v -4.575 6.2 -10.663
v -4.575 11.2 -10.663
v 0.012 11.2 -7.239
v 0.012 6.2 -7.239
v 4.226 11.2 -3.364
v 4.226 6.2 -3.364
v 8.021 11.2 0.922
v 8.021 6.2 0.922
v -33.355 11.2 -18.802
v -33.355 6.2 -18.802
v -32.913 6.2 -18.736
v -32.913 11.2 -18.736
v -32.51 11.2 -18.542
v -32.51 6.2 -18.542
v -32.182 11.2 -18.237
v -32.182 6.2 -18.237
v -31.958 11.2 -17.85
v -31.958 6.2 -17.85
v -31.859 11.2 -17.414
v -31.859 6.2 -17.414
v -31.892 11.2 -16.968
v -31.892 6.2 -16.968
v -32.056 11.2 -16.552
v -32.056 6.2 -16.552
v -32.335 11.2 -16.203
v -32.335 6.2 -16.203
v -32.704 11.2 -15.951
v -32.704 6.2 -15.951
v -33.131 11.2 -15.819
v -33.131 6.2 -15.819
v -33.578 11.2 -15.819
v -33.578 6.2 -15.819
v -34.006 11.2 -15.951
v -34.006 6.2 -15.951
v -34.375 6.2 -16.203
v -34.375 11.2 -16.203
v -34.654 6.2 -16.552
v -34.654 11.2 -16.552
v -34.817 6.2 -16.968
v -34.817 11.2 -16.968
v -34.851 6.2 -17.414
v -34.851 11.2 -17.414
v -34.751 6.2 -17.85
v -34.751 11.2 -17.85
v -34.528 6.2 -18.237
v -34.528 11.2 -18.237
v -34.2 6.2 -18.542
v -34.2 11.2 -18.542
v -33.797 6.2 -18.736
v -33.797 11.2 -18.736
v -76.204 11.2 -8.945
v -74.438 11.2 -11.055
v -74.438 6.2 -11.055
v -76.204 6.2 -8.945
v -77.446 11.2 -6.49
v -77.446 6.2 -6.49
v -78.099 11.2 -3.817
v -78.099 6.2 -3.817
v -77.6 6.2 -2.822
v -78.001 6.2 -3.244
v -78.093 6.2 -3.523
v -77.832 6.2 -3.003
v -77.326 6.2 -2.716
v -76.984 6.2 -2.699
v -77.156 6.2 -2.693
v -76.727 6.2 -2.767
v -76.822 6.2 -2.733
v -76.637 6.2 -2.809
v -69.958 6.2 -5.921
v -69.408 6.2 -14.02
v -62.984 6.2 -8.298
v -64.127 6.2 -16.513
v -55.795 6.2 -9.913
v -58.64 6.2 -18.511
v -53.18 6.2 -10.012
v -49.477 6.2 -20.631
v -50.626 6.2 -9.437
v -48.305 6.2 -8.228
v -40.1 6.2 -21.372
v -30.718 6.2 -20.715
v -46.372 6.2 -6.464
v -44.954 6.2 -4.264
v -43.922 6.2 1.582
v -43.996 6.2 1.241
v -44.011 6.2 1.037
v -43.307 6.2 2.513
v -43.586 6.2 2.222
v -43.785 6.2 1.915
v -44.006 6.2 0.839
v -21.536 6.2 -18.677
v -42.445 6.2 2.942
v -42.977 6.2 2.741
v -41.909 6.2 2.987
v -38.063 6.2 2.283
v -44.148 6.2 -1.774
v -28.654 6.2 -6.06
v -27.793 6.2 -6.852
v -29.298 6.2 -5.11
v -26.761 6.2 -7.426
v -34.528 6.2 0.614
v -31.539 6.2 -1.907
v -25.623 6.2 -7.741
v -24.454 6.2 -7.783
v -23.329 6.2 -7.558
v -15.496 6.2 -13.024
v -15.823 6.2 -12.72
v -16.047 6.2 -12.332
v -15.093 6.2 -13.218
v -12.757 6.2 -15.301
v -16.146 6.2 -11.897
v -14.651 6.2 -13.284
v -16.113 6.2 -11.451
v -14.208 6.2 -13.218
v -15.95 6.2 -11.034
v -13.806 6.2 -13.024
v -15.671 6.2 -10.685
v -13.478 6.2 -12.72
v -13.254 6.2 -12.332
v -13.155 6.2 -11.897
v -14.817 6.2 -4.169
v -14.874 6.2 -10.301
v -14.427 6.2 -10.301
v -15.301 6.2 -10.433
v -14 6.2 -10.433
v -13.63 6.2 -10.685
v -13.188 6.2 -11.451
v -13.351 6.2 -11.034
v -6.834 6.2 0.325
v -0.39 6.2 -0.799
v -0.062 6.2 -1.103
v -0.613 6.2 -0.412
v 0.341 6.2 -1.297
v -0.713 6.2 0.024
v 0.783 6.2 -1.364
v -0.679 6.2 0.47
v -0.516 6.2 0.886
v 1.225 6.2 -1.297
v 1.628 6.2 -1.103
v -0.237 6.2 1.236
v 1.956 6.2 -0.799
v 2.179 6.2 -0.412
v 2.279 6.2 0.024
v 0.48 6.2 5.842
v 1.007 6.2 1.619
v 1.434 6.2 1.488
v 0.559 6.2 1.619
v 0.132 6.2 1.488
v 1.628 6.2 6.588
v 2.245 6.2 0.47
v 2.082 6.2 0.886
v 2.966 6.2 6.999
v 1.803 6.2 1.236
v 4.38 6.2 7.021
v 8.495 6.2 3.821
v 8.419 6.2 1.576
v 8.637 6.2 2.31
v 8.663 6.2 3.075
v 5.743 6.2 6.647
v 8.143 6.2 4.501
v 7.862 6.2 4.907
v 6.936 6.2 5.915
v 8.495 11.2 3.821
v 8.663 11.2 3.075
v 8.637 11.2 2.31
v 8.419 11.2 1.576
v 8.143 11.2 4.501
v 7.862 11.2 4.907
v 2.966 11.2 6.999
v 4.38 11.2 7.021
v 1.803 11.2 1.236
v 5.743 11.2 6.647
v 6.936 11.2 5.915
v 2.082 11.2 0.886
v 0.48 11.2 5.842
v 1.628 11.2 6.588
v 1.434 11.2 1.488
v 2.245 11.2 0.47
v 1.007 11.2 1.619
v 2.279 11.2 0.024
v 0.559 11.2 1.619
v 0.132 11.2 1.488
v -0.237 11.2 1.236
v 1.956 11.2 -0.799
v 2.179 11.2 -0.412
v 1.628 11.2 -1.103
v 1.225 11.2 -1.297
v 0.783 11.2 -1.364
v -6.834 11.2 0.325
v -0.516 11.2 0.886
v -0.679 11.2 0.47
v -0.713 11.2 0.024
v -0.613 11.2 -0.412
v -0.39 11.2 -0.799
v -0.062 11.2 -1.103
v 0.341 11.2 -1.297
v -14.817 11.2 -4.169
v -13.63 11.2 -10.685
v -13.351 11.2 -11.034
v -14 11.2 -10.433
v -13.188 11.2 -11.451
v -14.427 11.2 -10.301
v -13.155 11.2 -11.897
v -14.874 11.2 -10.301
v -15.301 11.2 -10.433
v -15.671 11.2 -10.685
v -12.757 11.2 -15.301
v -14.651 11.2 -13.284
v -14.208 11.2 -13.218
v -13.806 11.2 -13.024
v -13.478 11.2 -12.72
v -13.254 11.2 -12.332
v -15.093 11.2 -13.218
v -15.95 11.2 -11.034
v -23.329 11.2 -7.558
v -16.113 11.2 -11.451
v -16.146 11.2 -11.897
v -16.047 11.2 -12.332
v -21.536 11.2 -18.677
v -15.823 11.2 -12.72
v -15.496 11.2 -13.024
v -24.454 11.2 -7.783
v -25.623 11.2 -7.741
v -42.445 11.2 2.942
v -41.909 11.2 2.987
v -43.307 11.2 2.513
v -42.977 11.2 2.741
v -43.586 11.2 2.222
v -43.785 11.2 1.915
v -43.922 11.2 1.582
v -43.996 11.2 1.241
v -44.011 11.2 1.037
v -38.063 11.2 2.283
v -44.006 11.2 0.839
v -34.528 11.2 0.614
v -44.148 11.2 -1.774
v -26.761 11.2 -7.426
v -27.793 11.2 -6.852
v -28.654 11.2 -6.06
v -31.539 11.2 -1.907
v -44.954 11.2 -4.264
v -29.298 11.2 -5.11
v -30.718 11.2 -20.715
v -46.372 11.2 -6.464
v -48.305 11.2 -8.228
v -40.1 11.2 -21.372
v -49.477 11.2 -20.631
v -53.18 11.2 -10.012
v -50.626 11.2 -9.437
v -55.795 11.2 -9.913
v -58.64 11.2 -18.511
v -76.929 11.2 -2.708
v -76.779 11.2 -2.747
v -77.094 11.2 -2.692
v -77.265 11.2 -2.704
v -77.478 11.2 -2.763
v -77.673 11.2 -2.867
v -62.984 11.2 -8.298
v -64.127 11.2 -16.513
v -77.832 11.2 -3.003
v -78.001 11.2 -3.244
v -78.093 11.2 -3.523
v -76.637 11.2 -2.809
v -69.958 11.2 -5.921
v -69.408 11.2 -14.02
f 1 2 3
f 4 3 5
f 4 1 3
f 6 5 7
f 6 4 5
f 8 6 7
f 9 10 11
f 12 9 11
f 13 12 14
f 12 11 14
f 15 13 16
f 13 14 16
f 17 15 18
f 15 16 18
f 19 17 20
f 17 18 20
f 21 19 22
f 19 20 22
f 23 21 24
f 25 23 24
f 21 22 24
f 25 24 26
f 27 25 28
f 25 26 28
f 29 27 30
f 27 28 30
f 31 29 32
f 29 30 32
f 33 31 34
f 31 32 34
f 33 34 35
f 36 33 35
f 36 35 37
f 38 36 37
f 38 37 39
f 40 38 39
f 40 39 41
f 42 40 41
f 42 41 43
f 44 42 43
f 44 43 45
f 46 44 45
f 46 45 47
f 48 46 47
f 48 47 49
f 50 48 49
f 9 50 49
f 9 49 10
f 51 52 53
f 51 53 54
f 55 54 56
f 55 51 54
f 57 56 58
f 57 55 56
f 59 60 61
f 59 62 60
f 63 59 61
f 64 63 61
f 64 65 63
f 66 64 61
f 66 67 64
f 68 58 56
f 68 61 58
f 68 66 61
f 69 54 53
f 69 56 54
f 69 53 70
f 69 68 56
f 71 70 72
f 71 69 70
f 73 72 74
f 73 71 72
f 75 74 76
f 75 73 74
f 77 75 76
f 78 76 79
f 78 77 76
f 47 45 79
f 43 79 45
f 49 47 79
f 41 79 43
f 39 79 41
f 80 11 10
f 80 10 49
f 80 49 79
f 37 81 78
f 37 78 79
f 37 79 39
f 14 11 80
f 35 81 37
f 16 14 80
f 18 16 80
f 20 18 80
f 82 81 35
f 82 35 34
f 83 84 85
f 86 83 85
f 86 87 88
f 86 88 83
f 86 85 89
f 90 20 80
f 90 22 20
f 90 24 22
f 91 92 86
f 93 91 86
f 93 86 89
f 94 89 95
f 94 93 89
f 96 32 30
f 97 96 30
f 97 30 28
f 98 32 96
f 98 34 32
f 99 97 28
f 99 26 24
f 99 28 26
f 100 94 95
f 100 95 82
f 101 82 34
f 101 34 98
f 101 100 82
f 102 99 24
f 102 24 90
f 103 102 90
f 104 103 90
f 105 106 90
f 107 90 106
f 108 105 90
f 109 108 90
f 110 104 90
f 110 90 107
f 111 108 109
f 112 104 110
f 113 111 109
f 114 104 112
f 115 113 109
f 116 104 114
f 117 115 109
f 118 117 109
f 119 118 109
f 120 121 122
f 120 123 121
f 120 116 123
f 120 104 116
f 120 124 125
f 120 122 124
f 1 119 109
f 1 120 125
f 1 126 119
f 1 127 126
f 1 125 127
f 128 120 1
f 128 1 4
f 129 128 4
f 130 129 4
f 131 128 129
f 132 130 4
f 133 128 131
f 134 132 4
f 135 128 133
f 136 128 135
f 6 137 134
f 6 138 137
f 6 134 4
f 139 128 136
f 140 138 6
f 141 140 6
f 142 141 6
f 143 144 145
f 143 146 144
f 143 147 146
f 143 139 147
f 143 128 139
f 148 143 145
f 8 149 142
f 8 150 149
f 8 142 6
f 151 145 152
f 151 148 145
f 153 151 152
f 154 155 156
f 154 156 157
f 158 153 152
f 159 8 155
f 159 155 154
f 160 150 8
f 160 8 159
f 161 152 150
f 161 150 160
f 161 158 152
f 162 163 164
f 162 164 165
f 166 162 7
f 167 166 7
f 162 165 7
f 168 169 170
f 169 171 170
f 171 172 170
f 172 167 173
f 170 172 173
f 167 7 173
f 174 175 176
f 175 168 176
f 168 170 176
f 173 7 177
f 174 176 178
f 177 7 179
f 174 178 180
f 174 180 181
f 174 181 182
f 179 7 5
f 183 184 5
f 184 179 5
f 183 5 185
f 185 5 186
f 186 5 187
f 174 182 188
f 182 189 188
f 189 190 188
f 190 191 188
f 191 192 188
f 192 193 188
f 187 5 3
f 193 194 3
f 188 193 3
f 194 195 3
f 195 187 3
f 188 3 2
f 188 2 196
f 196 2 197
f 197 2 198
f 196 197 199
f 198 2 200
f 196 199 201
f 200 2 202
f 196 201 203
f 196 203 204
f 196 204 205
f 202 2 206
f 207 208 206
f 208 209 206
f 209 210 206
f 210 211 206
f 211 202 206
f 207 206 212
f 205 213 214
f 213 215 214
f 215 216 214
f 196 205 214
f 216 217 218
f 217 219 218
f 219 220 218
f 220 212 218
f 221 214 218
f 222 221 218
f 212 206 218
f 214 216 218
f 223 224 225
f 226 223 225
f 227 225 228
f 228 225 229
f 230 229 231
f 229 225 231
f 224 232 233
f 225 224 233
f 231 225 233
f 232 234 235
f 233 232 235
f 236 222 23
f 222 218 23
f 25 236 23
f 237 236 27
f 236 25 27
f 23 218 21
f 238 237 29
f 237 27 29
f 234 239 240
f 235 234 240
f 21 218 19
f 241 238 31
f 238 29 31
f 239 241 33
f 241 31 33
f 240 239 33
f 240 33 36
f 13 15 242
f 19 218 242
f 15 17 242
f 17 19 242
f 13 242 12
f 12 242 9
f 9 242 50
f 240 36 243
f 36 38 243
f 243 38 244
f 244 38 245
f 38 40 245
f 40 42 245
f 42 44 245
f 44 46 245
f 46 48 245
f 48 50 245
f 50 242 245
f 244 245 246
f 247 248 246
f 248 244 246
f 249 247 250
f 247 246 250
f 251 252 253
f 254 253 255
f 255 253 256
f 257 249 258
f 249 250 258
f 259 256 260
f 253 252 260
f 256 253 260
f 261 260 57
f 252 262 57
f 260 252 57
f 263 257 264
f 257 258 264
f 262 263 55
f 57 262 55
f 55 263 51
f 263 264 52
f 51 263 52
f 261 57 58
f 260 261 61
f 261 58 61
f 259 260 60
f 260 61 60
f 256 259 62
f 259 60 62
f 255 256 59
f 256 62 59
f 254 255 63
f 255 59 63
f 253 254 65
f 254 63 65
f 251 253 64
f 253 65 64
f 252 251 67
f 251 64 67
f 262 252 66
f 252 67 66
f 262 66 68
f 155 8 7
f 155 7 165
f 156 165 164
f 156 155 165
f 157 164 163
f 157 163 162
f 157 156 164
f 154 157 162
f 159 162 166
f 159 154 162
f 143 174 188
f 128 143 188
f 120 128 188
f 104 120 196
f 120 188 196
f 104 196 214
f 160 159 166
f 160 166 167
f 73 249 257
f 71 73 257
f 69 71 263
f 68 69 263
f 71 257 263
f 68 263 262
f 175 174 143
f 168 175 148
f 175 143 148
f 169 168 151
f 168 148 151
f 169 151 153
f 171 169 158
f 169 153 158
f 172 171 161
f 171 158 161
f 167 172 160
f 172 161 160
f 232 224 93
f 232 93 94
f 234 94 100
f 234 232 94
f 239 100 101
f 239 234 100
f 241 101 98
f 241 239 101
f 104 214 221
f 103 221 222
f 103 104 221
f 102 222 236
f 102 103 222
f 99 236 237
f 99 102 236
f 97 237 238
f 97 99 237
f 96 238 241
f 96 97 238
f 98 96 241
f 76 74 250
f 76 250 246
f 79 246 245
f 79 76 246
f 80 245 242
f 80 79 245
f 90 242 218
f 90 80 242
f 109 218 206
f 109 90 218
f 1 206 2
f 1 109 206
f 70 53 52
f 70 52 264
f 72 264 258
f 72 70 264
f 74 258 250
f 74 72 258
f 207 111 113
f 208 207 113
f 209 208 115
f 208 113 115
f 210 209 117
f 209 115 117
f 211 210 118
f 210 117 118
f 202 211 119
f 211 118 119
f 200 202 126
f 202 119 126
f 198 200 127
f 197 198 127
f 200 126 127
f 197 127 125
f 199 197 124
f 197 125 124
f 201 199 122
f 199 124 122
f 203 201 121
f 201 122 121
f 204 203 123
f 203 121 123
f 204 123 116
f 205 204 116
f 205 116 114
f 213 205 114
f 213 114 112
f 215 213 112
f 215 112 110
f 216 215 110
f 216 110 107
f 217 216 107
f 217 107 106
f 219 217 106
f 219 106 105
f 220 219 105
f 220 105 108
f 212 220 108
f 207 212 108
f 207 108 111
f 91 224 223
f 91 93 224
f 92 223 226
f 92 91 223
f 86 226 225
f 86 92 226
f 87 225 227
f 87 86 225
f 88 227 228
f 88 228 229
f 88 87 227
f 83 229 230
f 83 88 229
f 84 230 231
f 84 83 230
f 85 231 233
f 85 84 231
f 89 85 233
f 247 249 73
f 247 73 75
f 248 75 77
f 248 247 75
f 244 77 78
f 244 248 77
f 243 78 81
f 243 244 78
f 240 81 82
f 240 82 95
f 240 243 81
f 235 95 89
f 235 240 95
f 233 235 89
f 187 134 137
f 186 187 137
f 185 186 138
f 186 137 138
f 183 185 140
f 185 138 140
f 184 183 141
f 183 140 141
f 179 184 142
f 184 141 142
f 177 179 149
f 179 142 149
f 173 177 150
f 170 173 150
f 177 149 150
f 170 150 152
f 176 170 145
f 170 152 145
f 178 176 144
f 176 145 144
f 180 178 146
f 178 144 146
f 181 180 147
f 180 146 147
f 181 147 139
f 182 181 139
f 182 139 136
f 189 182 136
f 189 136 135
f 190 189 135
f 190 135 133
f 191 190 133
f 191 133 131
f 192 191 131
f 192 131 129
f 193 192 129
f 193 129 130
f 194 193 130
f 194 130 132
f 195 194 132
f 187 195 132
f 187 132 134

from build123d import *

# Parameters (mm, degrees)
SKETCH_1_R               = 1.5
EXTRUDE_1_DEPTH          = 1.2
EXTRUDE_2_DEPTH          = 10
CUT_EXTRUDE_1_DEPTH      = 93.096371411
CUT_EXTRUDE_1_DEPTH_BACK = 93.096371411
SKETCH_4_R               = 1.5
CUT_EXTRUDE_2_DEPTH      = 5000
SKETCH_5_R               = 1.5
CUT_EXTRUDE_3_DEPTH      = 500
SKETCH_9_R               = 1.5
CUT_EXTRUDE_6_DEPTH      = 500
SKETCH_6_W               = 134.066841626
SKETCH_6_H               = 48.328770964
CUT_EXTRUDE_4_DEPTH      = 1.2
SKETCH_7_W               = 136.291178365
SKETCH_7_H               = 54.597356319
CUT_EXTRUDE_5_DEPTH      = 5
SKETCH_8_R               = 2.504998637
EXTRUDE_3_DEPTH          = 5
CUT_EXTRUDE_START        = -500
CUT_EXTRUDE_7_DEPTH      = 500
CUT_EXTRUDE_8_DEPTH      = 500
CUT_EXTRUDE_9_DEPTH      = 500
FILLET_2_R               = 5
EXTRUDE_4_DEPTH          = 5
FILLET_3_R               = 5
FILLET_4_R               = 2
CUT_EXTRUDE_10_DEPTH     = 50
FILLET_5_R               = 1


with BuildPart() as part:
    # 草图1 → 凸台-拉伸1 (new body)
    with BuildSketch(Plane(origin=(0, 0, 0), x_dir=(1, 0, 0), z_dir=(0, 1, 0))):
        with BuildLine():
            Line((1.554842025, -8.337470752), (-0.430182488, -6.721253648))
            add(Edge.make_bspline(
                [(-12.167013089, 2.582495486), (-11.447119164, 1.921340953), (-10.022984841, 2.808187734), (-8.976354657, 1.809108801), (-8.213499094, 1.403974471), (-8.200391236, 0.349911537), (-8.042555918, -0.493978579), (-7.818959944, -1.429413296), (-6.816890722, -1.753533483), (-5.863601288, -1.34252738), (-4.741281829, -1.710962858), (-4.08275959, -2.621388779), (-3.79245167, -3.751248723), (-3.91045161, -4.869308905), (-3.232112336, -5.62677615), (-2.206661316, -6.030432082), (-1.046114317, -6.062557348), (-0.554897819, -6.564537203), (-0.430182488, -6.721253648)],
                knots=[0, 0, 0, 0, 0.036097754, 0.047992692, 0.058181774, 0.069734768, 0.087708592, 0.096698401, 0.107023851, 0.126400839, 0.138602891, 0.153227265, 0.171393147, 0.187122158, 0.197485969, 0.211171774, 0.233173167, 0.241577569, 0.241577569, 0.241577569, 0.241577569], degree=3))
            add(Edge.make_bspline(
                [(-23.910622578, 9.605703978), (-23.558251314, 9.383041776), (-22.85001025, 7.300114936), (-21.469099437, 8.026620732), (-20.587576459, 8.115237732), (-19.709548371, 8.393102022), (-18.887373608, 8.016971733), (-18.216370279, 7.270572104), (-17.540916668, 6.495384207), (-16.917331111, 5.169819241), (-15.366310155, 5.588705202), (-13.906745135, 5.747852304), (-12.700950999, 4.350101993), (-12.869807319, 3.109436312), (-12.167013089, 2.582495486)],
                knots=[0, 0, 0, 0, 0.161236225, 0.212348344, 0.265446348, 0.336192936, 0.378687986, 0.430636784, 0.526782428, 0.58317029, 0.682556587, 0.781270878, 0.853713789, 1, 1, 1, 1], degree=3))
            add(Edge.make_bspline(
                [(-47.71500508, 10.605110168), (-47.069012481, 9.900665068), (-45.139196949, 9.95795741), (-43.921975491, 11.586374146), (-42.400721003, 11.771016568), (-41.337482007, 11.307681084), (-40.40808197, 10.571392493), (-39.243263098, 10.605948191), (-38.4214004, 11.389817674), (-37.304125392, 11.739033216), (-35.960015429, 12.177678326), (-35.169730239, 11.095889884), (-34.309116257, 10.597574945), (-33.230198284, 10.326758803), (-32.483614479, 11.172498611), (-31.555931442, 11.556931314), (-30.496219104, 11.833170836), (-29.544579211, 11.011421042), (-28.764862011, 9.931048883), (-27.275040054, 9.791587696), (-25.67786866, 9.995507673), (-24.429632089, 10.493743868), (-23.910622578, 9.605703978)],
                knots=[0, 0, 0, 0, 0.101433113, 0.182304189, 0.213922123, 0.268056796, 0.309965909, 0.34593792, 0.389140378, 0.432998877, 0.482664358, 0.529097115, 0.56671955, 0.598853252, 0.644172777, 0.680167064, 0.715860802, 0.759457234, 0.81099574, 0.863337515, 0.916048189, 1, 1, 1, 1], degree=3))
            add(Edge.make_bspline(
                [(-81.542178077, -6.351268144), (-81.044844843, -4.213625321), (-76.423345521, -7.044199198), (-77.193888837, -1.434611804), (-74.499558051, -1.007137962), (-72.119579546, -0.982023336), (-72.013913214, 2.531930358), (-69.193446107, 2.27076818), (-66.979018583, 2.576834428), (-66.793337265, 4.561491582), (-65.228171966, 5.86647802), (-63.704347585, 5.431207109), (-62.480661462, 5.233397848), (-61.483715157, 6.199125284), (-61.300552849, 7.503159562), (-59.783145719, 8.397586745), (-58.519758063, 7.703062295), (-57.095970203, 7.658840879), (-55.836025853, 8.294649296), (-55.32460036, 9.901269354), (-53.585326171, 9.702085323), (-52.400209447, 9.422945796), (-50.584393612, 8.813116301), (-50.168047343, 11.113872633), (-48.335164825, 11.166138113), (-47.71500508, 10.605110168)],
                knots=[0, 0, 0, 0, 0.100331873, 0.186040252, 0.234954161, 0.270300487, 0.337741822, 0.40191981, 0.438279808, 0.476829941, 0.523229195, 0.559516768, 0.58417291, 0.604077361, 0.648703103, 0.670042471, 0.715950186, 0.738312734, 0.768610762, 0.808997733, 0.834826144, 0.87587524, 0.906400305, 0.9417144, 1, 1, 1, 1], degree=3))
            add(Edge.make_bspline(
                [(-4.574887638, 10.66290641), (-7.047776333, 12.318799851), (-11.472376922, 14.618164059), (-18.644622628, 18.44627649), (-25.552826118, 20.285346034), (-32.311147255, 21.765124491), (-38.45622276, 22.334485332), (-46.036730806, 22.337974028), (-53.580560852, 21.321427277), (-60.391912278, 19.259553222), (-67.916492846, 16.400566872), (-77.044091587, 11.490220125), (-84.229889169, 5.096115142), (-88.471829307, 0.104808879), (-88.546333927, -3.099341055), (-86.895953255, -6.534699066), (-83.496346554, -7.409474397), (-81.542178077, -6.351268144)],
                knots=[0.083499365, 0.083499365, 0.083499365, 0.083499365, 0.162308773, 0.214040795, 0.297345888, 0.349154488, 0.396314503, 0.459530434, 0.548645129, 0.595484357, 0.646703325, 0.76081959, 0.864658636, 0.902713076, 0.926128156, 0.944546812, 1, 1, 1, 1], degree=3))
            ThreePointArc((-4.574887638, 10.66290641), (2.168791448, 5.355026647), (8.021297782, -0.921832822))
            ThreePointArc((8.021297782, -0.921832822), (8.67491192, -2.691224286), (8.143227785, -4.500994872))
            Line((8.143227785, -4.500994872), (5.915584874, -7.718701298))
            ThreePointArc((5.915584874, -7.718701298), (3.870472767, -8.981318439), (1.554842025, -8.337470752))
        make_face()
        with Locations(Location((-81.41369729, 0.541251493, 0), (0, 0, 270))):
            Circle(SKETCH_1_R, mode=Mode.SUBTRACT)
        with Locations(Location((0.783039877, -0.136157483, 0), (0, 0, 270))):
            Circle(SKETCH_1_R, mode=Mode.SUBTRACT)
        with Locations(Location((-33.354785226, 17.302208681, 0), (0, 0, 270))):
            Circle(SKETCH_1_R, mode=Mode.SUBTRACT)
    extrude(amount=EXTRUDE_1_DEPTH)

    # 草图2 → 凸台-拉伸2 (add)
    with BuildSketch(Plane(origin=(0, 1.2, 0), x_dir=(1, 0, 0), z_dir=(0, 1, 0))):
        with BuildLine():
            Line((8.143227785, -4.500994872), (5.915584874, -7.718701298))
            ThreePointArc((5.915584874, -7.718701298), (3.870472767, -8.981318439), (1.554842025, -8.337470752))
            ThreePointArc((1.554842025, -8.337470752), (-39.653813959, 6.874149931), (-81.542178077, -6.351268144))
            ThreePointArc((-81.542178077, -6.351268144), (-86.809846383, -6.371610018), (-88.423257633, -1.357066439))
            ThreePointArc((-88.423257633, -1.357066439), (-48.803984412, 20.731416825), (-4.574887638, 10.66290641))
            ThreePointArc((-4.574887638, 10.66290641), (2.168791448, 5.355026647), (8.021297782, -0.921832822))
            ThreePointArc((8.021297782, -0.921832822), (8.67491192, -2.691224286), (8.143227785, -4.500994872))
        make_face()
    extrude(amount=EXTRUDE_2_DEPTH)

    # 草图3 → 切除-拉伸1 (cut, two sides: drawn at the far end of the back side and taken through both)
    with BuildSketch(Plane(origin=(0, 11.2, 0), x_dir=(1, 0, 0), z_dir=(0, 1, 0)).offset(-CUT_EXTRUDE_1_DEPTH_BACK)):
        with BuildLine():
            Line((-87.507027042, -5.743661214), (-106.141269059, 14.985848881))
            Line((-106.141269059, 14.985848881), (-8.241902353, 31.206831816))
            Line((-8.241902353, 31.206831816), (8.962170457, 13.429289912))
            Line((8.962170457, 13.429289912), (8.021297782, -0.921832822))
            ThreePointArc((8.021297782, -0.921832822), (5.215580669, 2.32898401), (2.168791448, 5.355026647))
            ThreePointArc((2.168791448, 5.355026647), (-1.101119594, 8.138467032), (-4.574887638, 10.66290641))
            ThreePointArc((-4.574887638, 10.66290641), (-48.803984412, 20.731416825), (-88.423257633, -1.357066439))
            ThreePointArc((-88.423257633, -1.357066439), (-88.556022202, -3.673781246), (-87.507027042, -5.743661214))
        make_face()
        with BuildLine():
            Line((1.554842025, -8.337470752), (-81.542178077, -6.351268144))
            ThreePointArc((-81.542178077, -6.351268144), (-39.653813959, 6.874149931), (1.554842025, -8.337470752))
        make_face()
    extrude(amount=CUT_EXTRUDE_1_DEPTH + CUT_EXTRUDE_1_DEPTH_BACK, mode=Mode.SUBTRACT)

    # 草图4 → 切除-拉伸2 (cut)
    with BuildSketch(Plane.XZ):
        with Locations(Location((0.783039877, 0.136157483, 0), (0, 0, 270))):
            Circle(SKETCH_4_R)
    extrude(amount=-CUT_EXTRUDE_2_DEPTH, mode=Mode.SUBTRACT)

    # 草图5 → 切除-拉伸3 (cut)
    with BuildSketch(Plane(origin=(0, 0, 0), x_dir=(-1, 0, 0), z_dir=(0, -1, 0))):
        with Locations(Location((33.354785226, 17.302208681, 0), (0, 0, 90))):
            Circle(SKETCH_5_R)
        with Locations((81.41369729, 0.541251493)):
            Circle(SKETCH_5_R)
    extrude(amount=-CUT_EXTRUDE_3_DEPTH, mode=Mode.SUBTRACT)

    # 草图9 → 切除-拉伸6 (cut)
    with BuildSketch(Plane.XZ):
        with Locations(Location((-14.650535253, -11.784407101, 0), (0, 0, 270))):
            Circle(SKETCH_9_R)
    extrude(amount=-CUT_EXTRUDE_6_DEPTH, mode=Mode.SUBTRACT)

    # 草图6 → 切除-拉伸4 (cut)
    with BuildSketch(Plane.XZ):
        with Locations((-44.334364387, -13.713059238)):
            Rectangle(SKETCH_6_W, SKETCH_6_H)
    extrude(amount=-CUT_EXTRUDE_4_DEPTH, mode=Mode.SUBTRACT)

    # 草图7 → 切除-拉伸5 (cut)
    with BuildSketch(Plane.XZ.offset(-1.2)):
        with Locations((-47.064232203, -10.780978991)):
            Rectangle(SKETCH_7_W, SKETCH_7_H)
    extrude(amount=-CUT_EXTRUDE_5_DEPTH, mode=Mode.SUBTRACT)

    # 草图8 → 凸台-拉伸3 (add)
    with BuildSketch(Plane(origin=(0, 11.2, 0), x_dir=(1, 0, 0), z_dir=(0, 1, 0))):
        with Locations((-81.41369729, 0.541251493)):
            Circle(SKETCH_8_R)
    extrude(amount=-EXTRUDE_3_DEPTH)

    # 草图12 → 切除-拉伸7 (cut)
    with BuildSketch(Plane(origin=(0, 11.2, 0), x_dir=(1, 0, 0), z_dir=(0, 1, 0)).offset(CUT_EXTRUDE_START)):
        with BuildLine():
            Line((-58.639801005, 18.510571882), (-112.071356554, 17.290982028))
            Line((-112.071356554, 17.290982028), (-102.035647415, -15.683490858))
            Line((-102.035647415, -15.683490858), (-71.109278434, -17.799864895))
            Line((-71.109278434, -17.799864895), (-72.583441893, -0.763949275))
            ThreePointArc((-72.583441893, -0.763949275), (-77.17168255, -3.38304187), (-81.542178077, -6.351268144))
            ThreePointArc((-81.542178077, -6.351268144), (-84.21561064, -7.222088194), (-86.87883151, -6.320520766))
            ThreePointArc((-86.87883151, -6.320520766), (-88.505413997, -3.431359279), (-87.496633924, -0.272975602))
            ThreePointArc((-87.496633924, -0.272975602), (-74.361355564, 11.10542341), (-58.639801005, 18.510571882))
        make_face()
    extrude(amount=CUT_EXTRUDE_7_DEPTH, mode=Mode.SUBTRACT)

    # 草图13 → 切除-拉伸8 (cut)
    with BuildSketch(Plane(origin=(0, 11.2, 0), x_dir=(1, 0, 0), z_dir=(0, 1, 0))):
        with BuildLine():
            Line((-58.639801005, 18.510571882), (-93.715909783, 19.516276053))
            Line((-93.715909783, 19.516276053), (-99.02615609, -9.026297846))
            Line((-99.02615609, -9.026297846), (-86.075060822, -21.472187628))
            Line((-86.075060822, -21.472187628), (-50.736103736, -15.249242737))
            Line((-50.736103736, -15.249242737), (-34.722392217, -9.026297846))
            Line((-34.722392217, -9.026297846), (-40.736049388, 6.891380001))
            ThreePointArc((-40.736049388, 6.891380001), (-63.801132914, 6.078389209), (-85.188761068, -2.595041141))
            ThreePointArc((-85.188761068, -2.595041141), (-87.346939719, -2.261053128), (-87.32425699, -0.077302094))
            ThreePointArc((-87.32425699, -0.077302094), (-74.252009108, 11.176444211), (-58.639801005, 18.510571882))
        make_face()
    extrude(amount=-CUT_EXTRUDE_8_DEPTH, mode=Mode.SUBTRACT)

    # 草图14 → 切除-拉伸9 (cut)
    with BuildSketch(Plane(origin=(0, 11.2, 0), x_dir=(1, 0, 0), z_dir=(0, 1, 0))):
        with BuildLine():
            Line((-85.188761068, -2.595041141), (9.410288112, -16.335196714))
            Line((9.410288112, -16.335196714), (3.870472767, -8.981318439))
            ThreePointArc((3.870472767, -8.981318439), (-39.477229569, 10.694099657), (-85.188761068, -2.595041141))
        make_face()
    extrude(amount=-CUT_EXTRUDE_9_DEPTH, mode=Mode.SUBTRACT)

    # 圆角2
    fillet_2_edges = [part.edges().sort_by_distance(p)[0] for p in [
        (3.870472767, 8.7, 8.981318439),
    ]]
    fillet(fillet_2_edges, radius=FILLET_2_R)

    # 草图16 → 凸台-拉伸4 (add)
    with BuildSketch(Plane(origin=(0, 11.2, 0), x_dir=(1, 0, 0), z_dir=(0, 1, 0))):
        with BuildLine():
            ThreePointArc((-55.7948874, 9.913169561), (-46.540448411, 6.6587671), (-44.381584205, -2.910719914))
            ThreePointArc((-44.381584205, -2.910719914), (-33.893561356, -0.183849707), (-27.936053363, 8.868362338))
            ThreePointArc((-27.936053363, 8.868362338), (-41.811811004, 10.821544438), (-55.7948874, 9.913169561))
        make_face()
    extrude(amount=-EXTRUDE_4_DEPTH)

    # 圆角3
    fillet_3_edges = [part.edges().sort_by_distance(p)[0] for p in [
        (-27.936053363, 8.7, -8.868362338),
    ]]
    fillet(fillet_3_edges, radius=FILLET_3_R)

    # 圆角4
    fillet_4_edges = [part.edges().sort_by_distance(p)[0] for p in [
        (-44.381584205, 8.7, 2.910719914),
    ]]
    fillet(fillet_4_edges, radius=FILLET_4_R)

    # 草图17 → 切除-拉伸10 (cut)
    with BuildSketch(Plane(origin=(0, 11.2, 0), x_dir=(1, 0, 0), z_dir=(0, 1, 0))):
        with BuildLine():
            Line((-78.188761068, 1.956223286), (-81.129694376, -16.673779651))
            Line((-81.129694376, -16.673779651), (-94.709773696, -4.588158821))
            Line((-94.709773696, -4.588158821), (-97.178879027, 7.17257973))
            Line((-97.178879027, 7.17257973), (-87.324260178, -0.077297303))
            ThreePointArc((-87.324260178, -0.077297303), (-80.335174498, 6.963906587), (-72.245380583, 12.706824424))
            ThreePointArc((-72.245380583, 12.706824424), (-76.68832012, 8.144891799), (-78.188761068, 1.956223286))
        make_face()
    extrude(amount=-CUT_EXTRUDE_10_DEPTH, mode=Mode.SUBTRACT)

    # 圆角5
    fillet_5_edges = [part.edges().sort_by_distance(p)[0] for p in [
        (-78.188761068, 8.7, -1.956223286),
    ]]
    fillet(fillet_5_edges, radius=FILLET_5_R)


solid = part.part
